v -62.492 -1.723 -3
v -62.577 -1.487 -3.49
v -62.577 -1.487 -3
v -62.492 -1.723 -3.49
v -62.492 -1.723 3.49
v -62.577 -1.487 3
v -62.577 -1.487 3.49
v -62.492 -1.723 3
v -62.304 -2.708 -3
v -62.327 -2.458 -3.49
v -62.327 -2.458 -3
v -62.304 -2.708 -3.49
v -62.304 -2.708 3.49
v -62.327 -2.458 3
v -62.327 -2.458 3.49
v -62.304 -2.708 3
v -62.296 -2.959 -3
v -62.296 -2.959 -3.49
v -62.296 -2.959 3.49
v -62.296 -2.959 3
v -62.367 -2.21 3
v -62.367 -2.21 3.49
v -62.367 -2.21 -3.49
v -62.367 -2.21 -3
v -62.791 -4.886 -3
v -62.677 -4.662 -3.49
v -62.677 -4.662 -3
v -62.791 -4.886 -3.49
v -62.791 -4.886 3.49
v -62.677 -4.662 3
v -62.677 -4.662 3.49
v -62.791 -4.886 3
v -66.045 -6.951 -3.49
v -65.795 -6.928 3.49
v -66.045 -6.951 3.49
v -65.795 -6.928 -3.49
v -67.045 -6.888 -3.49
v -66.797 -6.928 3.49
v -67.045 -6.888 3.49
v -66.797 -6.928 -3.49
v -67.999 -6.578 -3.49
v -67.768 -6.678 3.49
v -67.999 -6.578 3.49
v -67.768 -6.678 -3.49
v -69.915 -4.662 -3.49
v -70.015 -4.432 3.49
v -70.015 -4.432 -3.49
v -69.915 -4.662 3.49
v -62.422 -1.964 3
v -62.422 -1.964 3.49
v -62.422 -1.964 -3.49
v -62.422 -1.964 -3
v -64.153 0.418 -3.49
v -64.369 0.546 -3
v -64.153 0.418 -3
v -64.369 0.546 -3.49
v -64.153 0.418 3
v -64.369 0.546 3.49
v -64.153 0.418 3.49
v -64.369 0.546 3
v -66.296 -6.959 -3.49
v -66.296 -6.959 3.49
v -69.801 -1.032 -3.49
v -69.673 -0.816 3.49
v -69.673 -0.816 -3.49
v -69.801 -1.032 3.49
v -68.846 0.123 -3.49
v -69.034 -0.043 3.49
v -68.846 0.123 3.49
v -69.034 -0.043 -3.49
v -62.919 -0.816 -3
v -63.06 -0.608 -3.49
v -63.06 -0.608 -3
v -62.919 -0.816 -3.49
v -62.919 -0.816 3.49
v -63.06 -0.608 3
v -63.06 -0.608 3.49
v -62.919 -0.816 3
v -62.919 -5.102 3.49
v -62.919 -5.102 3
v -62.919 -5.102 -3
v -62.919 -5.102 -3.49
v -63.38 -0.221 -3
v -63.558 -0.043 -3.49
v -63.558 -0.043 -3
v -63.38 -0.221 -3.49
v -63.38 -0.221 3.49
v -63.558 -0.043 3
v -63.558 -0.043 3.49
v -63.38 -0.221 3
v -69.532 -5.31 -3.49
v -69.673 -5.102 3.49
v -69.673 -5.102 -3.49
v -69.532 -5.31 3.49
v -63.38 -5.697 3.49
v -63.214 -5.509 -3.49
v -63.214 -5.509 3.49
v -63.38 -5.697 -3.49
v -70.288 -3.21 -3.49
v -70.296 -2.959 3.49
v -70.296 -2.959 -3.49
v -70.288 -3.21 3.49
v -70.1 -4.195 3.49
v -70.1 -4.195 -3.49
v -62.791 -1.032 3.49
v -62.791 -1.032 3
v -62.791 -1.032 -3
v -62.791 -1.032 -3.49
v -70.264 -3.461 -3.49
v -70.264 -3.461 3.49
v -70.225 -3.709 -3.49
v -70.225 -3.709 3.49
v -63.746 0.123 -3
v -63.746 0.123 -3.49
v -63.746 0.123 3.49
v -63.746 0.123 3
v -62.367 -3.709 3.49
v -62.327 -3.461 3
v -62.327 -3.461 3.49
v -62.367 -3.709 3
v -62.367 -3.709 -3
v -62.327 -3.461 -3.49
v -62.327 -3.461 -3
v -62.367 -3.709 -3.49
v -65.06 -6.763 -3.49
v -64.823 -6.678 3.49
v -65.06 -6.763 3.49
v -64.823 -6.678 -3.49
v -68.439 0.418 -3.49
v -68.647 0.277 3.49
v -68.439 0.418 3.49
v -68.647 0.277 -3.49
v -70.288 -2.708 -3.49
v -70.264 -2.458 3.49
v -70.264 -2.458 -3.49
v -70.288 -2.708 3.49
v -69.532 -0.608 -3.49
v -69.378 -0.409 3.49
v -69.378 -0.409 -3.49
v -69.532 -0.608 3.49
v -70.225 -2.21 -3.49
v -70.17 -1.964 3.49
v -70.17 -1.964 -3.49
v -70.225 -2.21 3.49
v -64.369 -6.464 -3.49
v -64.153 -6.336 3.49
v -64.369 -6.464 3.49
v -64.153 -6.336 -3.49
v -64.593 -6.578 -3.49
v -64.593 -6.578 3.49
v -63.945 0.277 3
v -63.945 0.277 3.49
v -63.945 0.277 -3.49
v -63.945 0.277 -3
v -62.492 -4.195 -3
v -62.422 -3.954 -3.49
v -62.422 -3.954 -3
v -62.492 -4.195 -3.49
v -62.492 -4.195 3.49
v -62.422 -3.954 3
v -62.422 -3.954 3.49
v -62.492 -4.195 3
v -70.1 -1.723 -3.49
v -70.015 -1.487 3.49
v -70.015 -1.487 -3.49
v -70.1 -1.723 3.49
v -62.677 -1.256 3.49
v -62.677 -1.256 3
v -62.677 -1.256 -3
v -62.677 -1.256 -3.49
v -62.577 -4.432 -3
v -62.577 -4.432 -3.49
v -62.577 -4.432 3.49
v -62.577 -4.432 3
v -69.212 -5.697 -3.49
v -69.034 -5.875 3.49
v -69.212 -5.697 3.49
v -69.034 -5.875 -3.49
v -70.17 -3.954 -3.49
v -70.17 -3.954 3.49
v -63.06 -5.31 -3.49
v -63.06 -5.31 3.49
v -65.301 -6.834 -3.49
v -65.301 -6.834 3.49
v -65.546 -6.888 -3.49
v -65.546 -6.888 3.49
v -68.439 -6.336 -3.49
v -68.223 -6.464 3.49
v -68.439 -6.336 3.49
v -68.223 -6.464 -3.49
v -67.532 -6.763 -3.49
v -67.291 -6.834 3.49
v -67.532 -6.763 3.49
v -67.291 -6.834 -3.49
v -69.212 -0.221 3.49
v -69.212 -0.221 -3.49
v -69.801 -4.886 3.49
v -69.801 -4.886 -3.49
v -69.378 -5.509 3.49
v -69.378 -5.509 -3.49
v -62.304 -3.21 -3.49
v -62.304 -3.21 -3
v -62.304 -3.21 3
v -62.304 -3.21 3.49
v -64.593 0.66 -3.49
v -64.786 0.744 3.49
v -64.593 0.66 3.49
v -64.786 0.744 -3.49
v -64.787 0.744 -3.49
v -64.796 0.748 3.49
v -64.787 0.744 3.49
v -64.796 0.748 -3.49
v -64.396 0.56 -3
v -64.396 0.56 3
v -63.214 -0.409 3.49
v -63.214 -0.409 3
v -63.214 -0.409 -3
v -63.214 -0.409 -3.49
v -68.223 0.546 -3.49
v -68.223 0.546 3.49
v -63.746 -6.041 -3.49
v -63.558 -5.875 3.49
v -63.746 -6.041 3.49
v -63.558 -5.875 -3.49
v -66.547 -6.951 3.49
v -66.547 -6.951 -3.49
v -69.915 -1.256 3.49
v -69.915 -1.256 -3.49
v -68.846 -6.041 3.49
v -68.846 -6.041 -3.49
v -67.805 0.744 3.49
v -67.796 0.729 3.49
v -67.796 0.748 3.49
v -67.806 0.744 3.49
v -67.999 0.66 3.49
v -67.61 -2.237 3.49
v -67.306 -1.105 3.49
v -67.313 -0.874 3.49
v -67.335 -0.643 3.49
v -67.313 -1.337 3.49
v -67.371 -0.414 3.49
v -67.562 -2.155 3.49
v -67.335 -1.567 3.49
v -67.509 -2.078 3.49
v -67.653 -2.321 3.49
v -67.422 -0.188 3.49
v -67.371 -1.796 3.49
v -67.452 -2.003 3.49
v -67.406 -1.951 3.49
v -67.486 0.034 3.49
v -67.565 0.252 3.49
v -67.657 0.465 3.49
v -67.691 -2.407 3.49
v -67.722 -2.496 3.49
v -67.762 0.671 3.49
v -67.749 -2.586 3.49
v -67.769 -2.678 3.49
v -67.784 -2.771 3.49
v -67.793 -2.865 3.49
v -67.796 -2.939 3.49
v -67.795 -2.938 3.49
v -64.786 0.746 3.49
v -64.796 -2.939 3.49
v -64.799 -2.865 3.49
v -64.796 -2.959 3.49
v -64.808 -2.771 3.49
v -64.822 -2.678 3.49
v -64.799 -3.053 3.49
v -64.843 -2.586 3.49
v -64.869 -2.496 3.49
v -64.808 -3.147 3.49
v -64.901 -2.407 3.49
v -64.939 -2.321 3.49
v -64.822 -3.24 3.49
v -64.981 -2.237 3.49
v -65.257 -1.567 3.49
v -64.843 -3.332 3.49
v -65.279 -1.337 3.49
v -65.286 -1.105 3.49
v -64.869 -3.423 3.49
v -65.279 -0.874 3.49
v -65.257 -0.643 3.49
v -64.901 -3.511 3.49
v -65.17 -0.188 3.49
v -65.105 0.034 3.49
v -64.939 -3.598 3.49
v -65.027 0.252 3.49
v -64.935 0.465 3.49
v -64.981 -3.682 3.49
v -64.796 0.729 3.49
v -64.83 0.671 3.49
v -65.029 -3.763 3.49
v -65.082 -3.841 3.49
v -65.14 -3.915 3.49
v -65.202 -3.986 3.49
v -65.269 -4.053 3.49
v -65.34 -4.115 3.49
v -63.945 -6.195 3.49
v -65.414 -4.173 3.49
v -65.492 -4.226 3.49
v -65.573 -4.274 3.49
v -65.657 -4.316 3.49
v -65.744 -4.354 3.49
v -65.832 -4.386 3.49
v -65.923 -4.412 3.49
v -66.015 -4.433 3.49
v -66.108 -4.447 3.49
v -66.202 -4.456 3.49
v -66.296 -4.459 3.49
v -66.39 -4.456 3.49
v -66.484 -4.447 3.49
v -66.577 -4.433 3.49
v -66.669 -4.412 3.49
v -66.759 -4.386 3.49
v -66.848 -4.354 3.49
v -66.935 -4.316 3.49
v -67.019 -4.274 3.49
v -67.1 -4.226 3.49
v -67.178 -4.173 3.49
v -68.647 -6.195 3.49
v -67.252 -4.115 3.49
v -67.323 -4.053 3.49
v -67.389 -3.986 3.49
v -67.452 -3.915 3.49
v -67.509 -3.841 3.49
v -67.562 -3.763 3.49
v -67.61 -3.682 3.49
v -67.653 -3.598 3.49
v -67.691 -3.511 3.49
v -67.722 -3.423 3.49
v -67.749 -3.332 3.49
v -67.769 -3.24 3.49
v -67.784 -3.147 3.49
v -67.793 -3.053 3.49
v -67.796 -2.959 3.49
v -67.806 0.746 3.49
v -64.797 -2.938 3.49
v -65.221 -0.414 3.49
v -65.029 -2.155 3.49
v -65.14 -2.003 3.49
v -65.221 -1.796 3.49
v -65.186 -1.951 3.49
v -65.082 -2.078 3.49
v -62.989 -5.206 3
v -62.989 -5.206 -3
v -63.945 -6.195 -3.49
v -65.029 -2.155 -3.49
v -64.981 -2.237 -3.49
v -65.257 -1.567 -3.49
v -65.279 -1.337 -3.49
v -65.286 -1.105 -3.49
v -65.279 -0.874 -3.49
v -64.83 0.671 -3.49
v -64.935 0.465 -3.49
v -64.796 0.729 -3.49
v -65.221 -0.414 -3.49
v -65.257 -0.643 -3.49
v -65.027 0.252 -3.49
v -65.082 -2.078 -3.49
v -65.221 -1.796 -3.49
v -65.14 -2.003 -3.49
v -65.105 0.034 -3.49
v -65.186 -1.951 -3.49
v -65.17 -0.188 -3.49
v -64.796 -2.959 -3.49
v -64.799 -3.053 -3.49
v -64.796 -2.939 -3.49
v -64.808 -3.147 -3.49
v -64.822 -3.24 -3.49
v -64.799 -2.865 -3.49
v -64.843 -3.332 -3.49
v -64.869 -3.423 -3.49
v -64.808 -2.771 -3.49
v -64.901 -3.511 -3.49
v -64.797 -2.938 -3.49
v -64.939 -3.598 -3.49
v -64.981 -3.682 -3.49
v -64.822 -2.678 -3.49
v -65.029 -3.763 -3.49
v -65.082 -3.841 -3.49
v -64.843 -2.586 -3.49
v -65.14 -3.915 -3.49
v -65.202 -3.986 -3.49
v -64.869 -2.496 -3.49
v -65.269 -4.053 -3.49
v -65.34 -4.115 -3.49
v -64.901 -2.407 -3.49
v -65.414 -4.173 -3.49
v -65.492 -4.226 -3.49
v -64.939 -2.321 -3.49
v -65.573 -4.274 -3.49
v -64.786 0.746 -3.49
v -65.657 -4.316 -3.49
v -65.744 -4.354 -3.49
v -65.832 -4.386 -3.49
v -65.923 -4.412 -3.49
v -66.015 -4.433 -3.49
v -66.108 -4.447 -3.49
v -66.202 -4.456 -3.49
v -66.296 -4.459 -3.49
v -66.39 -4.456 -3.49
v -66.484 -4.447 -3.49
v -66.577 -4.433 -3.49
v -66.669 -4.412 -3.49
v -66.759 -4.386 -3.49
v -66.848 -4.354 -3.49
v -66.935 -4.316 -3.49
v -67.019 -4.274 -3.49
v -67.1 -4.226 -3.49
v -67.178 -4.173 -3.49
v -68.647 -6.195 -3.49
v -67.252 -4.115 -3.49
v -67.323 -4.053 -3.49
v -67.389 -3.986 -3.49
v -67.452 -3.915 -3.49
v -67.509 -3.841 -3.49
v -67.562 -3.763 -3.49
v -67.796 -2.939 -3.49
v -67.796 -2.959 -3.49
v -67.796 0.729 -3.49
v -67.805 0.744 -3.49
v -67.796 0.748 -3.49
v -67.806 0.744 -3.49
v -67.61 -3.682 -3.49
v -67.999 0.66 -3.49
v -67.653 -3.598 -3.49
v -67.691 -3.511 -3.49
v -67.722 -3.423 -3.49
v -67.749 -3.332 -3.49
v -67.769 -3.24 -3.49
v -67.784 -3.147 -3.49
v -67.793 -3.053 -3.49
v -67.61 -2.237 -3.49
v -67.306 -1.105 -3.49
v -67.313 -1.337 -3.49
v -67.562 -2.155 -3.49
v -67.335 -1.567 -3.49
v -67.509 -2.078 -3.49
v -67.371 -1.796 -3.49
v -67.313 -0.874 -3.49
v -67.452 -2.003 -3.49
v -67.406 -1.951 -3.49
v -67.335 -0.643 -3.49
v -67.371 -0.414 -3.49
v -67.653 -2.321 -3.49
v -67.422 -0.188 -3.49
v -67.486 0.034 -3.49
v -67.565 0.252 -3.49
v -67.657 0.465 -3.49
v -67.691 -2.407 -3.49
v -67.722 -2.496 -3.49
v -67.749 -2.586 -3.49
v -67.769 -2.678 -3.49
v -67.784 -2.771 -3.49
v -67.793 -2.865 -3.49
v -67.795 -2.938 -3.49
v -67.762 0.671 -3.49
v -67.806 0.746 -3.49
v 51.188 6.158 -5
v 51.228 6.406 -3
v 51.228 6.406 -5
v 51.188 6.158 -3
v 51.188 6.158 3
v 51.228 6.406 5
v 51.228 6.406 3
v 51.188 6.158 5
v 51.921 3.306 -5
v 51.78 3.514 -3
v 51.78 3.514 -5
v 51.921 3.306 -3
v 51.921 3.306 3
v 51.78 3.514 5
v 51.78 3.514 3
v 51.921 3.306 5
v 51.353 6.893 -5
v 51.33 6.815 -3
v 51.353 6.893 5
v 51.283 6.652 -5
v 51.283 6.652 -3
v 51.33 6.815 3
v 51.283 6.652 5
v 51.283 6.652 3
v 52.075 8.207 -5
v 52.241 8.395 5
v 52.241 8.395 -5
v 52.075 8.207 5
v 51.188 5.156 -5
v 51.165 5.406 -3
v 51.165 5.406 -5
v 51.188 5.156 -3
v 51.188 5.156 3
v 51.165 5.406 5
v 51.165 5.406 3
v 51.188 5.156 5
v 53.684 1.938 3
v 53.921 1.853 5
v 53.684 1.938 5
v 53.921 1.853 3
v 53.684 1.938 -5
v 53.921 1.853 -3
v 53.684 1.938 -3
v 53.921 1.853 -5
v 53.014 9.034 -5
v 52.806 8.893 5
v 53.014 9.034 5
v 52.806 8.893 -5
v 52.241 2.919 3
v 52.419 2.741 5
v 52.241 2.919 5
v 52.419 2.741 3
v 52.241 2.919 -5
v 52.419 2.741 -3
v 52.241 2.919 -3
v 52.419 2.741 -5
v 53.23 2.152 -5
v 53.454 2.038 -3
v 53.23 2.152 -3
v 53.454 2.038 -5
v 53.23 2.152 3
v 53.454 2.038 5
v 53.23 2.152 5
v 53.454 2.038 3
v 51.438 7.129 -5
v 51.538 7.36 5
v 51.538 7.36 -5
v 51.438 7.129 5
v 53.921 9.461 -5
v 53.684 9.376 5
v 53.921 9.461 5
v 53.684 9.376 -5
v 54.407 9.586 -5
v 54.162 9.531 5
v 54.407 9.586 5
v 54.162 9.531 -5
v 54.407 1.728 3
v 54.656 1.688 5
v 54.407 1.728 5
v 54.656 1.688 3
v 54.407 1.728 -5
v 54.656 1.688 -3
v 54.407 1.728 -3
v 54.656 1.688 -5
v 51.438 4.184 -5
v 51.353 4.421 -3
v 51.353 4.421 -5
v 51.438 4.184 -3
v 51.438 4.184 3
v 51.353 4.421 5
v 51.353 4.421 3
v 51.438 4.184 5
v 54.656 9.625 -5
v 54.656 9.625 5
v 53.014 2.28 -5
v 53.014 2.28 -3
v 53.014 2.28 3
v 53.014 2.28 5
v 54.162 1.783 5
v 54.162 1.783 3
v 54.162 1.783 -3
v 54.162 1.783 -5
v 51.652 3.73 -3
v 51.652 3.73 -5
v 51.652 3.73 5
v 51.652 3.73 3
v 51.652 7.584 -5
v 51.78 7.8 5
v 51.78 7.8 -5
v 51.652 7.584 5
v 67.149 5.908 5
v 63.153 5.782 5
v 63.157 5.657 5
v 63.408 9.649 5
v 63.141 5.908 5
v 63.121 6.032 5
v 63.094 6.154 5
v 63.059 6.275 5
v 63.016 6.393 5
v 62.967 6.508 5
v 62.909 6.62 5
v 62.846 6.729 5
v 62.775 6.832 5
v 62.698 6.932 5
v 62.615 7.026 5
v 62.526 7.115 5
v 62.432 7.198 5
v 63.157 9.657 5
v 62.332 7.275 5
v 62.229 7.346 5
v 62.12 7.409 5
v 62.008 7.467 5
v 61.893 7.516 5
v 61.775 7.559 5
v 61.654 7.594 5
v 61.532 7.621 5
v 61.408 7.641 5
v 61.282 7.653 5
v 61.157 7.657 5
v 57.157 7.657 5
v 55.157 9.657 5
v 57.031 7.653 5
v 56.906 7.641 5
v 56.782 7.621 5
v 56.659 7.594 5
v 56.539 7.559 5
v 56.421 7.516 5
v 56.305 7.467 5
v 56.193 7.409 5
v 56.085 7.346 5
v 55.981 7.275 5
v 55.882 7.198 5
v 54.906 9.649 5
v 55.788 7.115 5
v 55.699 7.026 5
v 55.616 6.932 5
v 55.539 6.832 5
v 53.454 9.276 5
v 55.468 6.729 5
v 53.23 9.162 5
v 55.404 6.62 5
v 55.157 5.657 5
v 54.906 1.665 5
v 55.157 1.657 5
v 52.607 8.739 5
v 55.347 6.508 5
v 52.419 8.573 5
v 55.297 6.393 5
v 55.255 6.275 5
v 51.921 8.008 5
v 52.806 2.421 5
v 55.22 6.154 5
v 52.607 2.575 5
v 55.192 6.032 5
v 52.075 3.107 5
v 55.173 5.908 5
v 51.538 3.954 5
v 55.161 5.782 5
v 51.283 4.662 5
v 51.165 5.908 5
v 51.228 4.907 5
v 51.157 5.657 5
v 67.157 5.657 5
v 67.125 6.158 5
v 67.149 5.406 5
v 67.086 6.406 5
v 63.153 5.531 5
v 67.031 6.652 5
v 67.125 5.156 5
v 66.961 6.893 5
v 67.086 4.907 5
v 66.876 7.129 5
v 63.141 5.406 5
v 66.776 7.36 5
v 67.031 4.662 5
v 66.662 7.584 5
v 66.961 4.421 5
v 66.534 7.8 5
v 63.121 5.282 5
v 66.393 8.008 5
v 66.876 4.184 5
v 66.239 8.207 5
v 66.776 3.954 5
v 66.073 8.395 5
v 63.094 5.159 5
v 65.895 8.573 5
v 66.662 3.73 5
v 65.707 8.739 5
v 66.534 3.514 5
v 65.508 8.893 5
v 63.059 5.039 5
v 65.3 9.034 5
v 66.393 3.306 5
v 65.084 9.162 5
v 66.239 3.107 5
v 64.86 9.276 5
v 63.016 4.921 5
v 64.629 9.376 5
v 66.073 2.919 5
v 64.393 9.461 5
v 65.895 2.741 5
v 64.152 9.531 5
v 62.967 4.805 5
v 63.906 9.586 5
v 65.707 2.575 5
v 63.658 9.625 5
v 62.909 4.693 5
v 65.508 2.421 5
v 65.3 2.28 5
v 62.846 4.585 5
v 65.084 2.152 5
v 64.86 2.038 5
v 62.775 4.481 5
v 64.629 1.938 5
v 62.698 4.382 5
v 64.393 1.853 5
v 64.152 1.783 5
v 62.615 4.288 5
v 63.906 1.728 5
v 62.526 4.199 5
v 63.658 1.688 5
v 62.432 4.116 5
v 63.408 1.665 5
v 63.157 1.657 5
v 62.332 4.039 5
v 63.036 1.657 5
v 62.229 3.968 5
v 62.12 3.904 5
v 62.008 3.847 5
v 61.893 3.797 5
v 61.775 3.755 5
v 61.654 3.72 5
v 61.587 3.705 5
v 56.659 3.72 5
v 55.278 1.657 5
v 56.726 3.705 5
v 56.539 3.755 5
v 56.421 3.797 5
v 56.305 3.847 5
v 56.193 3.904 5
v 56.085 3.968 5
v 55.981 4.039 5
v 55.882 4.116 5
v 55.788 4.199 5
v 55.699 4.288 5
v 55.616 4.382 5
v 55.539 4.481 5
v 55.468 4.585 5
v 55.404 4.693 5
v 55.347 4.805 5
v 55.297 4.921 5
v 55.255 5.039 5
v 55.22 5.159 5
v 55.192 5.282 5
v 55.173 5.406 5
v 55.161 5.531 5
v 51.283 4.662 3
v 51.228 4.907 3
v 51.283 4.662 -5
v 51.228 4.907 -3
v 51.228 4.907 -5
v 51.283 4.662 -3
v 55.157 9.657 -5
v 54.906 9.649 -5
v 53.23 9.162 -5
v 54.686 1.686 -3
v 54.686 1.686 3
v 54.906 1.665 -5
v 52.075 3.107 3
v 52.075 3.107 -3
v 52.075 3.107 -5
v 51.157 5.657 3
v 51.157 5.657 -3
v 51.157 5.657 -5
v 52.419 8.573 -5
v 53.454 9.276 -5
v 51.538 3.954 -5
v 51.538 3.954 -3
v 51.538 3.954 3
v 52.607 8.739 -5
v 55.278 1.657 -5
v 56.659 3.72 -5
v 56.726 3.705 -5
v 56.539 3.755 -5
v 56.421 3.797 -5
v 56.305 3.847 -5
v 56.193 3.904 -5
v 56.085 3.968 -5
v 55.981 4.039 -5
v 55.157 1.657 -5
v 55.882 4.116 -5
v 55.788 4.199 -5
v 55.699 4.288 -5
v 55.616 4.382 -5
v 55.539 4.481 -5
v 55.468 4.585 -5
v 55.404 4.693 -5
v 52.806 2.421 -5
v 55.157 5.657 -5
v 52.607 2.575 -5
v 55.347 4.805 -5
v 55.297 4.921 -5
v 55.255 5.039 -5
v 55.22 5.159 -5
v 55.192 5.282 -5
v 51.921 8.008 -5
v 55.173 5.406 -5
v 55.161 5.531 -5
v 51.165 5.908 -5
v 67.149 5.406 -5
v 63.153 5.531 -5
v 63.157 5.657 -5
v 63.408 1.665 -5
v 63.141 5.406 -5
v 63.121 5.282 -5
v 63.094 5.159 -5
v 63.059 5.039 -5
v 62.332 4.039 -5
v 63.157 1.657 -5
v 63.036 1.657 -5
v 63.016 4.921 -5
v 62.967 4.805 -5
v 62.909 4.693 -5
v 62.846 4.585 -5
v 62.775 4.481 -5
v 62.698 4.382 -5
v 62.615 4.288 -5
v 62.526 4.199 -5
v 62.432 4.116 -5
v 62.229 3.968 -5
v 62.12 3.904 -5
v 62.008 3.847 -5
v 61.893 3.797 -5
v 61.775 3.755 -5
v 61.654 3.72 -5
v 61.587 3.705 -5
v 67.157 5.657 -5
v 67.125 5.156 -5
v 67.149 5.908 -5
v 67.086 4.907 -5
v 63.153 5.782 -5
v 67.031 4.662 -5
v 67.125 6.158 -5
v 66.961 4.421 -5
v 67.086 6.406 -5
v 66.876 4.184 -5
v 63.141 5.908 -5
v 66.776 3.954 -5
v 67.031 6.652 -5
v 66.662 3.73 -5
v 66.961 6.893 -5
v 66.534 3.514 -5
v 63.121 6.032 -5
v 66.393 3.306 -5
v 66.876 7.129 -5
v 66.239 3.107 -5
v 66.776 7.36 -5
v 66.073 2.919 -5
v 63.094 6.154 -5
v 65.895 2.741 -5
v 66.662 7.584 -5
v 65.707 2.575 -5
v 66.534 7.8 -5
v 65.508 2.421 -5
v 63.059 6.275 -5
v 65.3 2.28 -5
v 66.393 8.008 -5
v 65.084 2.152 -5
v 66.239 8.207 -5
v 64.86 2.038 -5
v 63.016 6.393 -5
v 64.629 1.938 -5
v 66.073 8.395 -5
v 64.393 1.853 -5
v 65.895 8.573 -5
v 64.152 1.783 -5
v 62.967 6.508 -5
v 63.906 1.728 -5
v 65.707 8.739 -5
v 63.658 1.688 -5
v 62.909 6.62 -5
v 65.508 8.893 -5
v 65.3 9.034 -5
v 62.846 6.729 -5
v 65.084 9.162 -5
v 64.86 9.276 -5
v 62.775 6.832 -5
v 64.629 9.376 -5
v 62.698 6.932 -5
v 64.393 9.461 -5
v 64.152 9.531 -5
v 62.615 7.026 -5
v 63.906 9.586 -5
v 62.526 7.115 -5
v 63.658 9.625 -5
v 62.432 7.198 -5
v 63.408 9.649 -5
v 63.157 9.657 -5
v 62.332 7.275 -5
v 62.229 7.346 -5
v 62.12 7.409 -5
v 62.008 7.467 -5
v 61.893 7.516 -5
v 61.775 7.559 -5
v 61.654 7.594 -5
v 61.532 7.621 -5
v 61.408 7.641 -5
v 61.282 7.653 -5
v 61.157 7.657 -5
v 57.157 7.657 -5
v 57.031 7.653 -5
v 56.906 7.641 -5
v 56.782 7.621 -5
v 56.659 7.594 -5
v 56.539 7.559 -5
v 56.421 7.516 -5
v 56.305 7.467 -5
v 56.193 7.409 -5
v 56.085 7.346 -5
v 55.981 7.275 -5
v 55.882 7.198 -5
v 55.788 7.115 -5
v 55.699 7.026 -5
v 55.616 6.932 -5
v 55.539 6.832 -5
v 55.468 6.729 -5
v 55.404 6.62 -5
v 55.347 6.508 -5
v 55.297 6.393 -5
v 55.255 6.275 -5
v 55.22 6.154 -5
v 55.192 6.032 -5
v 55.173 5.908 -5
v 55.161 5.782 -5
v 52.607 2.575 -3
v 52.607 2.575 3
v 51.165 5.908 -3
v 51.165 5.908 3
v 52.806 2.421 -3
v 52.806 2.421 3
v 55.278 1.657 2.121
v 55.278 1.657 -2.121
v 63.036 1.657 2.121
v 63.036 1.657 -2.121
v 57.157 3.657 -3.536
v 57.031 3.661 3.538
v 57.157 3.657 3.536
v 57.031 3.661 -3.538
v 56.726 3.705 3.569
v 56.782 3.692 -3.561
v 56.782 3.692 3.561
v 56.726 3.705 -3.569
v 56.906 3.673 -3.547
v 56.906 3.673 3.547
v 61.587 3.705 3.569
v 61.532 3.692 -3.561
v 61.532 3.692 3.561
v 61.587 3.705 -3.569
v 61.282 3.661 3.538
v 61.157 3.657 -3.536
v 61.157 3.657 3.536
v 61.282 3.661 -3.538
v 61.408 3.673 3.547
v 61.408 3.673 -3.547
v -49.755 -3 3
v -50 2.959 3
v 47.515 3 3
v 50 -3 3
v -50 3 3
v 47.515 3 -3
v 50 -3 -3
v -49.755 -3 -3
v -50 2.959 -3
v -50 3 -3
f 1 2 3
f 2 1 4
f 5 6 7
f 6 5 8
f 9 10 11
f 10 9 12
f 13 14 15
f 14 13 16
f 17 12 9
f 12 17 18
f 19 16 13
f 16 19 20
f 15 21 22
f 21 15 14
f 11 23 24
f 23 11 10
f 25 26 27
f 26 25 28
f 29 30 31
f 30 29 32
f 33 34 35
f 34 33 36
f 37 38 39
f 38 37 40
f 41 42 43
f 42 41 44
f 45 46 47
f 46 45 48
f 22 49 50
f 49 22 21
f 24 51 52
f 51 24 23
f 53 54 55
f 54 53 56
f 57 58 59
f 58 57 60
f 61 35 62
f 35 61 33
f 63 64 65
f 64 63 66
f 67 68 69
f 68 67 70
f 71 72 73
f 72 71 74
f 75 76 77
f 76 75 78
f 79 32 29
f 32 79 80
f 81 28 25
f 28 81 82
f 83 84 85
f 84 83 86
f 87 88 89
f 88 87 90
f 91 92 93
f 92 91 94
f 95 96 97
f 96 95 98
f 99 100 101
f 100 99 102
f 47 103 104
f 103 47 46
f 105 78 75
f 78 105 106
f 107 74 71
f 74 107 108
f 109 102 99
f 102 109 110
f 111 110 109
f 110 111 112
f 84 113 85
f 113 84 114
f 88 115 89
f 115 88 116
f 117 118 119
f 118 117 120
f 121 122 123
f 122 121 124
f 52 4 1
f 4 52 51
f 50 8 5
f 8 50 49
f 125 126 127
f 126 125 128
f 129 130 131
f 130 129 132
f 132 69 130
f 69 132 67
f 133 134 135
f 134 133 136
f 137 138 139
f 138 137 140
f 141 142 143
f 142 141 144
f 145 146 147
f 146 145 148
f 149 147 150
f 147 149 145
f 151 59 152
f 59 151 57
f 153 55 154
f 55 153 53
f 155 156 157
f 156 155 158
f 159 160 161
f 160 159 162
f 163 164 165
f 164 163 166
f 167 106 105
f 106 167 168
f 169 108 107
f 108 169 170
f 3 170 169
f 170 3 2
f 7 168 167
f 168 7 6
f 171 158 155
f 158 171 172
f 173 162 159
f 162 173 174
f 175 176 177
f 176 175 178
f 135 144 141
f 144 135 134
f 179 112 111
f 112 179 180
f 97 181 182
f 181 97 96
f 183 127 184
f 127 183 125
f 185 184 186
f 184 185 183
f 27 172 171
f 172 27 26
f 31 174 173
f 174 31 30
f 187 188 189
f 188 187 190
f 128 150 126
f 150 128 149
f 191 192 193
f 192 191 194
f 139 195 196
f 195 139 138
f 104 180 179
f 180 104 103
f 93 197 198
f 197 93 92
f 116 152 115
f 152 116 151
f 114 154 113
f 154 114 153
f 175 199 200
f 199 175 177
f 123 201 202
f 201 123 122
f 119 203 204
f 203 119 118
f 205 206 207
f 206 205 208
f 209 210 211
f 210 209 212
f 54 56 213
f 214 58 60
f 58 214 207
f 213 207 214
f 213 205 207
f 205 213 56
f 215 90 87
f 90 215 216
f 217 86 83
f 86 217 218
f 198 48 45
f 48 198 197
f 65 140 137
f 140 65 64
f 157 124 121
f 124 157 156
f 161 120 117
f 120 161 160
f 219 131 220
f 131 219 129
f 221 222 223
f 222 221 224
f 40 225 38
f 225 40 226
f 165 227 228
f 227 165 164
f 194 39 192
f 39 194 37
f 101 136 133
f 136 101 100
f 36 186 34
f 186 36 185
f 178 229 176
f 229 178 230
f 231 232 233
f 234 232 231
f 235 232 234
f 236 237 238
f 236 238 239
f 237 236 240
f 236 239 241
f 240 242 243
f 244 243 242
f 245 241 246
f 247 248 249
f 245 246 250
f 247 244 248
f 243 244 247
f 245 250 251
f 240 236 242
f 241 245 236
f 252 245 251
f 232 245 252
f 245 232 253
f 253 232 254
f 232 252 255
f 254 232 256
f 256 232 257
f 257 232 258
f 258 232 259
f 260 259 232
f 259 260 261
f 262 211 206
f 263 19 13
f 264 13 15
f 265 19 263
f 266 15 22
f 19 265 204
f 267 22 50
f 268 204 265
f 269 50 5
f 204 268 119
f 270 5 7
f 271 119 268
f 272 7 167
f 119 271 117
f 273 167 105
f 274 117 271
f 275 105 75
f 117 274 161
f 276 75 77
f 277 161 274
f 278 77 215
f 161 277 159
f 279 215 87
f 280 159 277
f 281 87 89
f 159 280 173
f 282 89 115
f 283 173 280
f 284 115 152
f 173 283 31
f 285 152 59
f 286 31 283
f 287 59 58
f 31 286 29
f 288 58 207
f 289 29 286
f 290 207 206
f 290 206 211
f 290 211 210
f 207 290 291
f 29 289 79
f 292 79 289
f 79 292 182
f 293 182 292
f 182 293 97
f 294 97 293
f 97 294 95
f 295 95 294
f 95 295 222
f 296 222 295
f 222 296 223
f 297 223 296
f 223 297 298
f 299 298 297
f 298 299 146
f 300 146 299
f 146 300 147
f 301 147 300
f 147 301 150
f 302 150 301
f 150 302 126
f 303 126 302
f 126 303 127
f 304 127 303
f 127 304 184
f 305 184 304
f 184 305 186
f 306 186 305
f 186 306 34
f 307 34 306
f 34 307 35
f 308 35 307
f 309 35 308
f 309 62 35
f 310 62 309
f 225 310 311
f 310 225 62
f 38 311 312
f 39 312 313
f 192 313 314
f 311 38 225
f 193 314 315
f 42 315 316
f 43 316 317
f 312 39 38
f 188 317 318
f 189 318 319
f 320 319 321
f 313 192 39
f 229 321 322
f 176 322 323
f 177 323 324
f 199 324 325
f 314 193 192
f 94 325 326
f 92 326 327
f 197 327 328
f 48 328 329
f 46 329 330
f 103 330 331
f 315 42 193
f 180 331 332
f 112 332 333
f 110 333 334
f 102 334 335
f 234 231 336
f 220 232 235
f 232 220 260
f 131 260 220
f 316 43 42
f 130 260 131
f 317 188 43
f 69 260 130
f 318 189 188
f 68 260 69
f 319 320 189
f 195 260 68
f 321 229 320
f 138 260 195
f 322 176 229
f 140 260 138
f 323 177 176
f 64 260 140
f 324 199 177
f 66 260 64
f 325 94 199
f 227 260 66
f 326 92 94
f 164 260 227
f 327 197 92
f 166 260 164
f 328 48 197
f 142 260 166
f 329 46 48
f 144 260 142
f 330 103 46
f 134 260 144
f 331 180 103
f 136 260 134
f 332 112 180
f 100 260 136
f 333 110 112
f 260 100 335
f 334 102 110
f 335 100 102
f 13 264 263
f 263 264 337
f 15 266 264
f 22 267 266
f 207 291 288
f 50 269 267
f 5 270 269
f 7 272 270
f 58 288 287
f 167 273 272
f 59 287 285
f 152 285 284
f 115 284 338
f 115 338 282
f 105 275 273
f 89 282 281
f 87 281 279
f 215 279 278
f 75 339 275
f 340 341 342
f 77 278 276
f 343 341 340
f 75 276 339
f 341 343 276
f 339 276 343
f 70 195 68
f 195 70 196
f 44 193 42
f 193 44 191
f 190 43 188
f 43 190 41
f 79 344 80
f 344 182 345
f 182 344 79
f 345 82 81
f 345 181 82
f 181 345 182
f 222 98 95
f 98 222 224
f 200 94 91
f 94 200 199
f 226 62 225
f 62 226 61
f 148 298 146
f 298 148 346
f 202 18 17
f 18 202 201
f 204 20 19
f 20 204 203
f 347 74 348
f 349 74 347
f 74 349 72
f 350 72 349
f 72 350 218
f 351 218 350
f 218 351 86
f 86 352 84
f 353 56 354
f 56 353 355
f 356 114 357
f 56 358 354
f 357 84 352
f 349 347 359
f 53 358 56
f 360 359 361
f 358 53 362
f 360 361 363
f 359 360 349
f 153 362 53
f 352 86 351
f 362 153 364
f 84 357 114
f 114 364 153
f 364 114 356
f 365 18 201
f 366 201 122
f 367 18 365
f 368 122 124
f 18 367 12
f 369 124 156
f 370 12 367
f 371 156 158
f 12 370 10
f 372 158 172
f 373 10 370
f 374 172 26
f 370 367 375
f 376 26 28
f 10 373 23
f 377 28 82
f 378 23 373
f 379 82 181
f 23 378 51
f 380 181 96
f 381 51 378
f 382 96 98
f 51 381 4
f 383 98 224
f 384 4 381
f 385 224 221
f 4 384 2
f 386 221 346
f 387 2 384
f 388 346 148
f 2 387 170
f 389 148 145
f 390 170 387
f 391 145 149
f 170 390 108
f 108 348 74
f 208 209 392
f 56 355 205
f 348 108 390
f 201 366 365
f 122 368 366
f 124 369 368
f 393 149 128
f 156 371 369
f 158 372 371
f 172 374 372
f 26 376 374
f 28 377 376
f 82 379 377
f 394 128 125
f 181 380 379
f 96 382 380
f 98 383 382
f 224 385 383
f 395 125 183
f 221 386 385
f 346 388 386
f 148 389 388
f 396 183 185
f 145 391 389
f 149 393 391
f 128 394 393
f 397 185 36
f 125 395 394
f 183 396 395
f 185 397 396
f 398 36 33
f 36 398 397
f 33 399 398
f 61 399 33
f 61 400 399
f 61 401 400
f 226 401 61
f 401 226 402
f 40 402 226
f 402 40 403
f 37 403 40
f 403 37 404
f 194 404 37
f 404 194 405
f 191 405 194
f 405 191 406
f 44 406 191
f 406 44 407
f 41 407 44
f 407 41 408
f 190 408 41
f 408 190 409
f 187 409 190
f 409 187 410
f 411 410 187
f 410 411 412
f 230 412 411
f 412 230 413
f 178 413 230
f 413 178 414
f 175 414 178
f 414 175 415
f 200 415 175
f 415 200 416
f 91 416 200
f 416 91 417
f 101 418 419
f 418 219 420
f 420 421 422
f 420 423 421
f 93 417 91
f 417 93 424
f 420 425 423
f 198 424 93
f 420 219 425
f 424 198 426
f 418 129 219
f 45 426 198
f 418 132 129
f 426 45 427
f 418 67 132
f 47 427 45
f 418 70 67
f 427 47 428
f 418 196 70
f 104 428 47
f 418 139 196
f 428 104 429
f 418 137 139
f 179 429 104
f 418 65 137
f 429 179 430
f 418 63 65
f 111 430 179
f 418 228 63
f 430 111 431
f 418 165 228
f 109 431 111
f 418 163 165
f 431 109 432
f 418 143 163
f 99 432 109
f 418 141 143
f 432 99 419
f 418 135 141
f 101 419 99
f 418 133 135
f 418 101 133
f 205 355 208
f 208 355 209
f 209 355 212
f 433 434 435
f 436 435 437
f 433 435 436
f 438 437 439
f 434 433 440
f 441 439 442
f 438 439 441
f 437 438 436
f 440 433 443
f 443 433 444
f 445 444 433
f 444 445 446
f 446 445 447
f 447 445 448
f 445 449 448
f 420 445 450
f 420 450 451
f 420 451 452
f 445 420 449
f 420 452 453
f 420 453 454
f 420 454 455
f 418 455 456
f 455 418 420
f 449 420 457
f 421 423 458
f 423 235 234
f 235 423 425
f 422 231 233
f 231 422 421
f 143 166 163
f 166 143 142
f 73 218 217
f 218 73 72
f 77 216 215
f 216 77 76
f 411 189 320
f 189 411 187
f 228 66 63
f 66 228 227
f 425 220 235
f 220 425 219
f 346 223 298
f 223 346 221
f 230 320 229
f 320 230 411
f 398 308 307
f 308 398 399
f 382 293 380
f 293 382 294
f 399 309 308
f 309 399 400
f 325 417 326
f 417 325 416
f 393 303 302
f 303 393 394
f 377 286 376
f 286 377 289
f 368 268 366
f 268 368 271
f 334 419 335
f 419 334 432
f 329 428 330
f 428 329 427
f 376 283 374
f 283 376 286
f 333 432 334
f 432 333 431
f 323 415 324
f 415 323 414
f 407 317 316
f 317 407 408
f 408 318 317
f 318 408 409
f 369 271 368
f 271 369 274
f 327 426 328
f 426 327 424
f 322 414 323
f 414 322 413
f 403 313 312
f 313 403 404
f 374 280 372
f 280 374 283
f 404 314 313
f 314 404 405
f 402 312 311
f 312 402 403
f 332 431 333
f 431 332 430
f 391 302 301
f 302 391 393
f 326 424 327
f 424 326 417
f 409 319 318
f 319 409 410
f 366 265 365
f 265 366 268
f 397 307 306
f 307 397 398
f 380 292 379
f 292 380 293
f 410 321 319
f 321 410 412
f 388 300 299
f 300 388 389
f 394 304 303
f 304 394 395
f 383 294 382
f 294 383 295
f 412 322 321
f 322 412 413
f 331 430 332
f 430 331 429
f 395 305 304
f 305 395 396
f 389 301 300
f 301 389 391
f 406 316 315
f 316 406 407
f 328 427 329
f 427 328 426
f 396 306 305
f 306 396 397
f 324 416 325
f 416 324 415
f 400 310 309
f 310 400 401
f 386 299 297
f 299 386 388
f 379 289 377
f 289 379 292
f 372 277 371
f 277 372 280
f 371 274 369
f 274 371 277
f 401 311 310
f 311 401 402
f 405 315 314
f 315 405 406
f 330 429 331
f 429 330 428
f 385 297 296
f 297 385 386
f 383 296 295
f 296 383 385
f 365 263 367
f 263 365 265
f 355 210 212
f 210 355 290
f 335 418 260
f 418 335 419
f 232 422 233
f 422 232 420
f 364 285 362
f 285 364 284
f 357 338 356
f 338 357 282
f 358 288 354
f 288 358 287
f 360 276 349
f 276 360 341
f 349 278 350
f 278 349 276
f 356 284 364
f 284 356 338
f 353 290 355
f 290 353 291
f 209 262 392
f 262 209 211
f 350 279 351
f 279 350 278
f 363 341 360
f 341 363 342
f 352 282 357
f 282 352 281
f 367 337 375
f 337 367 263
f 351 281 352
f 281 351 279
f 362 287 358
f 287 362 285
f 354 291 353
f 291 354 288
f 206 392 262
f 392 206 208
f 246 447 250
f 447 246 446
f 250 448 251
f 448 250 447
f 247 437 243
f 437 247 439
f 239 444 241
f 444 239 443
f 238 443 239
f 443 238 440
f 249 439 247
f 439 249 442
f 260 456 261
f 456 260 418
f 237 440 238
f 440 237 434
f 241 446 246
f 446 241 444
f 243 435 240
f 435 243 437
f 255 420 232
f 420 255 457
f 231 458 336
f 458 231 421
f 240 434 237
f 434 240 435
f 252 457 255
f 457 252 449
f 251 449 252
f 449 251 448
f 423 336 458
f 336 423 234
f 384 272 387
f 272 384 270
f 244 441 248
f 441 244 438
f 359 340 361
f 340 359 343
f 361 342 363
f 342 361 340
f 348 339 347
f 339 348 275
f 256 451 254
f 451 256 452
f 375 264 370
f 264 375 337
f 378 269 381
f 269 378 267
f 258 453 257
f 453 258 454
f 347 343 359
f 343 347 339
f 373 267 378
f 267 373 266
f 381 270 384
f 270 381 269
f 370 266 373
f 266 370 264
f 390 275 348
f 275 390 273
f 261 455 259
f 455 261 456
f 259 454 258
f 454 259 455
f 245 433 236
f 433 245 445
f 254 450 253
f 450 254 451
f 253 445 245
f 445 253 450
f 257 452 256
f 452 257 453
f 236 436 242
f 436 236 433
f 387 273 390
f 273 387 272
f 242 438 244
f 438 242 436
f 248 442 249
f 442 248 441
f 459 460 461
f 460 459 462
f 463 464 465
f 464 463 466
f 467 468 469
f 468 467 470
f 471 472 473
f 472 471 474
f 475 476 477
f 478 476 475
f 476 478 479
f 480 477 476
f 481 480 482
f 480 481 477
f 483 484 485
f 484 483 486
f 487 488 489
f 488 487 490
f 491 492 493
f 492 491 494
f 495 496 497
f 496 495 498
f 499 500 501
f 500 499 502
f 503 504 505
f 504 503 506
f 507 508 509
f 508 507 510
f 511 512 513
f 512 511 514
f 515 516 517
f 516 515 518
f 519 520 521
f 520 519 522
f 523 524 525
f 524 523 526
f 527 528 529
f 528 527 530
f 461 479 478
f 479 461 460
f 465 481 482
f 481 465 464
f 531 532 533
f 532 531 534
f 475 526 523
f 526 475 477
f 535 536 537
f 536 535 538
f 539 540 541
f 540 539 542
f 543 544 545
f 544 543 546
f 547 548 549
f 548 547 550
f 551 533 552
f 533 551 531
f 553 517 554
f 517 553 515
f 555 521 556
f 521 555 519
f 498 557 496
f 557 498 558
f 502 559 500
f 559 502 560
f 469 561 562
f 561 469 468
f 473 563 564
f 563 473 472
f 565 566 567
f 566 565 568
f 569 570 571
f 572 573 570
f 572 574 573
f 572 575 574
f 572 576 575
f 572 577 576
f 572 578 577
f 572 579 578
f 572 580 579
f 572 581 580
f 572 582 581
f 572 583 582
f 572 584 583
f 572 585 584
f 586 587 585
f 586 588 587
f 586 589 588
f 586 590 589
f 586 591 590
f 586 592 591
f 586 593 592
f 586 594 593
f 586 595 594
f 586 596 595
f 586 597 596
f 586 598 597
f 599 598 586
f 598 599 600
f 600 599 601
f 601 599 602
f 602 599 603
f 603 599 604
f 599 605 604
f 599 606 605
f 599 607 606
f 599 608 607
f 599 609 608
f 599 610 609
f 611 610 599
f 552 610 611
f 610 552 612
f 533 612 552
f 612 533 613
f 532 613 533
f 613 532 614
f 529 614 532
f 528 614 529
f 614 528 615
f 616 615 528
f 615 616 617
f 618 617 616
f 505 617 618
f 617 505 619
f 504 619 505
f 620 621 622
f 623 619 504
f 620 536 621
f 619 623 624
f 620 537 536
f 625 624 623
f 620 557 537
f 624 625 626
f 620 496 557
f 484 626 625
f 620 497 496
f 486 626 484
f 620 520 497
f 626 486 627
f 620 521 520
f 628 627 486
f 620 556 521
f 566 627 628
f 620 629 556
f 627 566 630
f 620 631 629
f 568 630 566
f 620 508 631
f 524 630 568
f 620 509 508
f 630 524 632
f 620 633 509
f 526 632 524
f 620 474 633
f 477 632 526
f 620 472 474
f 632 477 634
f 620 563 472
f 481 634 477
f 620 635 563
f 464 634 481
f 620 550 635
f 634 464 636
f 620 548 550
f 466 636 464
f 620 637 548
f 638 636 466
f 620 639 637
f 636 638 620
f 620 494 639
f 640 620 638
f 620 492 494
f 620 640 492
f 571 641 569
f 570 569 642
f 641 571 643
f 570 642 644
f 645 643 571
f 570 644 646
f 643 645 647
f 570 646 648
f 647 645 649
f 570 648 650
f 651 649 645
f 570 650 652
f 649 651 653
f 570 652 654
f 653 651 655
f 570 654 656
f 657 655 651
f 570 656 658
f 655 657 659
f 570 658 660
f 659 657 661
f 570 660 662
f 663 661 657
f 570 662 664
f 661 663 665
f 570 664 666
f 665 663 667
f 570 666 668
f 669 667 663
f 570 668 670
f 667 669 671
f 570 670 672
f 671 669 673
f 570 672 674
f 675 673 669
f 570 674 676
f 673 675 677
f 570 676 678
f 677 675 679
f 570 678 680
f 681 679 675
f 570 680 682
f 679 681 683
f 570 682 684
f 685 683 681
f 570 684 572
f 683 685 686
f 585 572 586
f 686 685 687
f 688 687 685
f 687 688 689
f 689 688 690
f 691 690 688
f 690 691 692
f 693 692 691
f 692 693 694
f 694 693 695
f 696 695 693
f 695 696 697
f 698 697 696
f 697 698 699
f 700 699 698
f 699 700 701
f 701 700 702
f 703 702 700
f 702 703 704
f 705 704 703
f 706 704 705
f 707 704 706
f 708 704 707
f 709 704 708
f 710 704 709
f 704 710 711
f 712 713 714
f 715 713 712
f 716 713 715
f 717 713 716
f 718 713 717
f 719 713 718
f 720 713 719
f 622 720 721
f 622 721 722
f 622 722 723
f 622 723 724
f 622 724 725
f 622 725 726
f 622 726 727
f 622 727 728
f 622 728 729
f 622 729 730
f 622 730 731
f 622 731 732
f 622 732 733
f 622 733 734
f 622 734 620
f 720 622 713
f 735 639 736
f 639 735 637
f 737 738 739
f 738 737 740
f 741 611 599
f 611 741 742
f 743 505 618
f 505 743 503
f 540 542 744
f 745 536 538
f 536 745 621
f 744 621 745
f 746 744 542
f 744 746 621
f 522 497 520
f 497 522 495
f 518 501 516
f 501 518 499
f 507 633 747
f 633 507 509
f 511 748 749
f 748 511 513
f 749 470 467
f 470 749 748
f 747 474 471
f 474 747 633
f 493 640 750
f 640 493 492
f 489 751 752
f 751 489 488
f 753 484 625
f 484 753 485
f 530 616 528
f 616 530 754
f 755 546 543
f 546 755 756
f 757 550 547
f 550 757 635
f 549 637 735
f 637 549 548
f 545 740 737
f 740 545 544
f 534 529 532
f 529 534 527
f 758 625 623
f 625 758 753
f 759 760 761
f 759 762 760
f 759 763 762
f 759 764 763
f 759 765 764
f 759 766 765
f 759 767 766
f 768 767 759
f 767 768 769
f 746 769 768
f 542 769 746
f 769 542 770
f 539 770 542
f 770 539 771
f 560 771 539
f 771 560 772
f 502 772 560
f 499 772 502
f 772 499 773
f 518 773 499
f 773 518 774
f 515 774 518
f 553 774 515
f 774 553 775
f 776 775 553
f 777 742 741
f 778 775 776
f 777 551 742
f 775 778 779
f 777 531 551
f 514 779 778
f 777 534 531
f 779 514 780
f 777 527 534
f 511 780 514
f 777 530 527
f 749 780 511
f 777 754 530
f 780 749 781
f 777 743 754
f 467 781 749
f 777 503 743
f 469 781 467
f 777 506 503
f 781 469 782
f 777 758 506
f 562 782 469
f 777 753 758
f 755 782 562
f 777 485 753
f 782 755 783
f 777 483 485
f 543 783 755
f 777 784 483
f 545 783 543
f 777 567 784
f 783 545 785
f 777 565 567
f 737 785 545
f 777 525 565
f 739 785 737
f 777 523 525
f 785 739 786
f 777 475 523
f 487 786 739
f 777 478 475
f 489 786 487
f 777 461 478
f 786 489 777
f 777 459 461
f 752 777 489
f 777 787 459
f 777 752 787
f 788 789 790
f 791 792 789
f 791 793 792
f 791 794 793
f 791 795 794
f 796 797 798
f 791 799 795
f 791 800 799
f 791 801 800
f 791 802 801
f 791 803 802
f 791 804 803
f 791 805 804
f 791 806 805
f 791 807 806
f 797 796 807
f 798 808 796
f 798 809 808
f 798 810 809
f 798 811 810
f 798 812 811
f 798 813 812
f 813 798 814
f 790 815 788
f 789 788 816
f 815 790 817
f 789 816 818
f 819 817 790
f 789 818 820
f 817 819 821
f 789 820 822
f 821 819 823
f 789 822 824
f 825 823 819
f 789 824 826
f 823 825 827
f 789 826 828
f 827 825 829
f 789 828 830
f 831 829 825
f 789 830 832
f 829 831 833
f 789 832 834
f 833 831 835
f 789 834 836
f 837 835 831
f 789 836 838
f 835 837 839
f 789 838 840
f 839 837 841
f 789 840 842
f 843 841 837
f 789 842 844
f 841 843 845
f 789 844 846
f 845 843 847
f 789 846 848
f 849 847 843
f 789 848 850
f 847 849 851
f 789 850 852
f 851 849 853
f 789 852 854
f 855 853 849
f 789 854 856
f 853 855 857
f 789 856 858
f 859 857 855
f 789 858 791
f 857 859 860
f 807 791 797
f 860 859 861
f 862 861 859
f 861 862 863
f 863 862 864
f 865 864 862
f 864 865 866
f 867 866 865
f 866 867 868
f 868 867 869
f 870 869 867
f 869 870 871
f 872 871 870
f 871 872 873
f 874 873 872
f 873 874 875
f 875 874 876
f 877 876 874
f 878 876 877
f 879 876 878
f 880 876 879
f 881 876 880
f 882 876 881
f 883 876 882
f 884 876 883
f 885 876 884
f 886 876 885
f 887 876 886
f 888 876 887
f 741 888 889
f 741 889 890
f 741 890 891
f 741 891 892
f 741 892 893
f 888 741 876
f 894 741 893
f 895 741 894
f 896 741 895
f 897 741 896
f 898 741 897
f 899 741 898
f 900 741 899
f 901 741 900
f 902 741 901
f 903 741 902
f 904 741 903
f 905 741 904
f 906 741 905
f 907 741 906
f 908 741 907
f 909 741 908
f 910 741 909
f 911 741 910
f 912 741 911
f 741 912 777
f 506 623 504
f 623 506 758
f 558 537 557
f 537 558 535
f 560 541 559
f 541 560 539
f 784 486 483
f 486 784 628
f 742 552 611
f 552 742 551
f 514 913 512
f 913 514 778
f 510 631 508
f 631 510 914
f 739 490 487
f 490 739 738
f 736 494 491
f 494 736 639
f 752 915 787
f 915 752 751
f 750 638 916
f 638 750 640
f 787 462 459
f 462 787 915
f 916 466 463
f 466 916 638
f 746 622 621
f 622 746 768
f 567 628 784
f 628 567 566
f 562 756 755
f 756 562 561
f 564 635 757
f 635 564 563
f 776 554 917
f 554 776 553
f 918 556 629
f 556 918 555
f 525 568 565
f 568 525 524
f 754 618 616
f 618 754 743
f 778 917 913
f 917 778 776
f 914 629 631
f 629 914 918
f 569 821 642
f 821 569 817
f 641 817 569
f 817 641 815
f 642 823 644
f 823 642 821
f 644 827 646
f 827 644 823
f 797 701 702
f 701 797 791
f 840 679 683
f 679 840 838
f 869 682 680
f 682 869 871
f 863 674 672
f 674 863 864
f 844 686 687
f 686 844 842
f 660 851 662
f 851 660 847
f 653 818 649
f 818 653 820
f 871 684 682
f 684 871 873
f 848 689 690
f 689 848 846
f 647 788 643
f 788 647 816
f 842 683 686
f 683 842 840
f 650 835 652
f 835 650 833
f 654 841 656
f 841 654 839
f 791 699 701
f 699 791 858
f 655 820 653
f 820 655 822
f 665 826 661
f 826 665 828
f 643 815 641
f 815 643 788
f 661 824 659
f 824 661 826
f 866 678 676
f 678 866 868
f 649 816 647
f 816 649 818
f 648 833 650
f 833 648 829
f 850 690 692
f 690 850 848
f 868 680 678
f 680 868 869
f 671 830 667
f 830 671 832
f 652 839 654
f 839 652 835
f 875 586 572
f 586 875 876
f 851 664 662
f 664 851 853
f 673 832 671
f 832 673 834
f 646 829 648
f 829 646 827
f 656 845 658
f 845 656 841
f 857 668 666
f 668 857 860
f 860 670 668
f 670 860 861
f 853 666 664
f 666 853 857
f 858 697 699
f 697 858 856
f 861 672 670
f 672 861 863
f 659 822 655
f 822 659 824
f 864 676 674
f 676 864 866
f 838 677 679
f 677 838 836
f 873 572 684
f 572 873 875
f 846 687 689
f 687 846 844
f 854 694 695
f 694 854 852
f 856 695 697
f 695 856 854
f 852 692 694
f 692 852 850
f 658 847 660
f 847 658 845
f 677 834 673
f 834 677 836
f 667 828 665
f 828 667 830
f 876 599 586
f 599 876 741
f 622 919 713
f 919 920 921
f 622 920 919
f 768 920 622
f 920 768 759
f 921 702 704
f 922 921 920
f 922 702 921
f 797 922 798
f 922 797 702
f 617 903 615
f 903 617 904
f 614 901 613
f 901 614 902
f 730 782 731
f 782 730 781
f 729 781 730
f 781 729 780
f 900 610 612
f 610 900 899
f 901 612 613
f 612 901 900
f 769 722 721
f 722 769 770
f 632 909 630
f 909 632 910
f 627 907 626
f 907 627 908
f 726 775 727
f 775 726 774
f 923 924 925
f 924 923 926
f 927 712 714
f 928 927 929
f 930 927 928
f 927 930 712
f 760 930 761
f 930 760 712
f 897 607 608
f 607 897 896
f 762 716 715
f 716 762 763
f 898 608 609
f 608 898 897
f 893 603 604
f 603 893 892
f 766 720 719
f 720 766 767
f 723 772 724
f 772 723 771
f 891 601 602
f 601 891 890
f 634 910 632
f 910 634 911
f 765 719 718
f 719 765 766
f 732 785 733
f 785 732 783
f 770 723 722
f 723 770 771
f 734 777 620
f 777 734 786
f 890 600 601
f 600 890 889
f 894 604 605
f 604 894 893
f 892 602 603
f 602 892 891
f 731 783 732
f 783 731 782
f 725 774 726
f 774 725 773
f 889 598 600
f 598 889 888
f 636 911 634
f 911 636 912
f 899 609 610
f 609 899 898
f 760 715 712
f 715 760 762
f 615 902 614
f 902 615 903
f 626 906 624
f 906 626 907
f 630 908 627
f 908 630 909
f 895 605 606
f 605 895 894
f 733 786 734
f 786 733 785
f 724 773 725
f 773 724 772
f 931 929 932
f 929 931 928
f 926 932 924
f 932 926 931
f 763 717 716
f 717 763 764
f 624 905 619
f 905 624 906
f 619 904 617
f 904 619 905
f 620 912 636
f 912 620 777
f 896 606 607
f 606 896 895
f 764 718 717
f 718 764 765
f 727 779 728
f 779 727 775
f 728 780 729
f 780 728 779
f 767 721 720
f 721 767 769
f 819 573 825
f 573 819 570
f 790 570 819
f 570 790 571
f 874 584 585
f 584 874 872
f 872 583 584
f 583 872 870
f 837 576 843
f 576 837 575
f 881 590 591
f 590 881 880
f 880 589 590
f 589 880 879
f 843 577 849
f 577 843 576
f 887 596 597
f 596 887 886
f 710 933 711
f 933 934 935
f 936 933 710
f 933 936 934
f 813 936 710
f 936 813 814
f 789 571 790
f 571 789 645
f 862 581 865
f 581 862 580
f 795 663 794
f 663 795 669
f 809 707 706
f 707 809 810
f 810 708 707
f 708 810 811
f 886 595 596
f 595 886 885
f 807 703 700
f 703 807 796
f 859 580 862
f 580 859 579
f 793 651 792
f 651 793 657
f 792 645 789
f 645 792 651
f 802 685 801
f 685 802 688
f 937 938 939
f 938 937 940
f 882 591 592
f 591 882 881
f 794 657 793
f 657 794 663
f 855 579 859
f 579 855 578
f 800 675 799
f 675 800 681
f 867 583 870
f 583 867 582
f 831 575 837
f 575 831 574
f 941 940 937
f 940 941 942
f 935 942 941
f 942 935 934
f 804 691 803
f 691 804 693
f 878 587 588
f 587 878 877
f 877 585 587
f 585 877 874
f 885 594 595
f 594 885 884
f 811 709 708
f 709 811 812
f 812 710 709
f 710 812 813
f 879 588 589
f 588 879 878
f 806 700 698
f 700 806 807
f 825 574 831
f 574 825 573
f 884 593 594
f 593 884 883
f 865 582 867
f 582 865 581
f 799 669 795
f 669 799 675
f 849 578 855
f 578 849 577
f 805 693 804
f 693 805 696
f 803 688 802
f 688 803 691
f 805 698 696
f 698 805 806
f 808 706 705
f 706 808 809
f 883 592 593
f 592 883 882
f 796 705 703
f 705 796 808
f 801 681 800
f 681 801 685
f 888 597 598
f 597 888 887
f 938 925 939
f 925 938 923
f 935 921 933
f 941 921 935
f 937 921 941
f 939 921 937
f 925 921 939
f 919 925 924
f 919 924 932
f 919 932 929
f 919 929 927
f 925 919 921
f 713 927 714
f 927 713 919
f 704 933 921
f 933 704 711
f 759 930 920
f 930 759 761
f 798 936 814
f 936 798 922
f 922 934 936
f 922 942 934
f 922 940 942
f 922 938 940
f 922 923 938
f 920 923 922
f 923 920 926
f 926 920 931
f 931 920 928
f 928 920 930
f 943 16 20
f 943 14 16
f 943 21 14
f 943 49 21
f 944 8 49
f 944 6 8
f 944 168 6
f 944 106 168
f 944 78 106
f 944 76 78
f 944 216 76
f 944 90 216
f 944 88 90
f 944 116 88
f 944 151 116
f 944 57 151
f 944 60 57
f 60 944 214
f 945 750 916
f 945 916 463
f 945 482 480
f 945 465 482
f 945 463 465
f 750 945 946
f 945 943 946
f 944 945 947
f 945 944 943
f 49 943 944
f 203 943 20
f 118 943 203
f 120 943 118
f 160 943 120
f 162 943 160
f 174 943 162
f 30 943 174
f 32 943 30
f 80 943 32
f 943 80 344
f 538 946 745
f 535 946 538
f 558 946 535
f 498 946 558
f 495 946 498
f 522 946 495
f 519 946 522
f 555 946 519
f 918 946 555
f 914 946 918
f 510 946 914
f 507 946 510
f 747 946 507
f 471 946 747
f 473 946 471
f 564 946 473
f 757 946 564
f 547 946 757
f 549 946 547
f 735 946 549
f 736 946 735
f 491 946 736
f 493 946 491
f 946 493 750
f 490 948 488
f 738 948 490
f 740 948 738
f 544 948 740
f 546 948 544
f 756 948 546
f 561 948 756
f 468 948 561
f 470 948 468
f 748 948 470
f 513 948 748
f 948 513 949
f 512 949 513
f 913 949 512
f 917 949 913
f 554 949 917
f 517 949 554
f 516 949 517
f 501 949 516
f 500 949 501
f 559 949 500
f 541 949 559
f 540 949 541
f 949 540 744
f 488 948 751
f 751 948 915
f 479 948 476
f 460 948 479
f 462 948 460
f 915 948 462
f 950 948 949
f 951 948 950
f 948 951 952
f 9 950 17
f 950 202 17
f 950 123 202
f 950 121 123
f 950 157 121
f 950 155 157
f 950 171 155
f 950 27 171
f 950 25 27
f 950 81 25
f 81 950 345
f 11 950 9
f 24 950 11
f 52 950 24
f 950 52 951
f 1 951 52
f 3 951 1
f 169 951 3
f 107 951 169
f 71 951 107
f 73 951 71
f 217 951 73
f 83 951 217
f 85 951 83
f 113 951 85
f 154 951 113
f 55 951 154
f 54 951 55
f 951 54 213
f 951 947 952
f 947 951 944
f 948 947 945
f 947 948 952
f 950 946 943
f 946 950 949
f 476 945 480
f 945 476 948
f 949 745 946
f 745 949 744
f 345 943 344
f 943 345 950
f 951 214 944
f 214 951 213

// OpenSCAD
// file: latch.scad
eps = 0.01;

module latch_1( h, d1, d2) {
    r1 = d1 / 2;
    r2 = d2 / 2;

    d = sqrt( r1 * r1 - r2 * r2 );
    d_2 = d / 2;
    h1 = 0.5;
    R = ( d_2 * d_2  + h1 * h1 ) / ( 2 * h1 );
    
    module aux() {
        translate( [ R - h1, 0, 0 ] )
            difference() {
                cylinder(h = h, r1 = R, r2 = R, center = true, $fn=100);
            
                translate( [ h1, 0 ,0 ] )
                    cube( [ 2 * R, 2 * R, h + eps ], center = true );
            }
    }
 
    module aux_2() {
        difference() {
            union() {
                translate( [ r2 + eps, d_2, 0 ] )
                    aux();
                
                translate( [ -r2 - eps, d_2, 0 ] )
                    rotate( [ 0, 0, 180 ] )
                        aux();
            }
            
            cylinder(h = h + eps, r1 = r2, r2 = r2, center = true, $fn=100);
        }
    }

    union() {
        difference() {
            cylinder(h = h, r1 = r1, r2 = r1, center = true, $fn=100);
            
            cylinder(h = h + eps, r1 = r2, r2 = r2, center = true, $fn=100);
            translate( [ 0, r1 / 2, 0 ] )
                cube( [ 2 * r2, r1, h + eps ],center = true);
        }
    
        aux_2();
    }
}
// main file
use <latch.scad>

eps = 0.01;

module shape( l , w, h ) {
    union() {
        translate( [ - l / 2, 0 , 0 ] )
            cylinder(h = h, r1 = w / 2, r2 = w / 2, center = true, $fn=100);
        
        translate( [ + l / 2, 0 , 0 ] )
            cylinder(h = h, r1 = w / 2, r2 = w / 2, center = true, $fn=100);
        
        cube( [ l, w, h ], center = true );
    }
}

// this part is not reused, so to make it easier I've just hardcoded
// values related to this opening
module latch_opening() {
    r = 6;
    tmpR = r * sqrt( 2 ) ;
        rotate( [ -90, 0, 0 ] )
            rotate( [ 0, 0, 45 ] )
                cylinder( h = tmpR, r1 = tmpR, r2 = 0, $fn=4);
}

module latch_2( l, w, h ) {
    difference() {
        shape( l, w, h );
        
        shape( l - 4, w - 4, h + eps );
        
        
        translate( [ 0, -7, 6 ] )
            latch_opening();
        
        translate( [ 0, -7, -6 ] )
            latch_opening();
    }
}

module lever() {
    union() {
        l = 100;
        w = 6;
        h = 6;
        cube( [ l, w, h ], center = true );
        
        l2 = 8;
        alfa = 45;
        translate( [ l / 2, - w / 2 , - h / 2 ] )
            rotate( [ 0, 0, alfa ] )
                cube( [ l2, w, h ], center = false );
        
        l3 = 15;
        beta = atan( 2.5 / l3 );
        w3 = w * cos( beta );
        translate( [ - l / 2, w3 / 2 , - h / 2 ] )
            rotate( [ 0, 0, 180 + beta ] )
                cube( [ l3, w3, h ], center = false );
        
        d1 = 8;
        d2 = 3;
        translate( [ - l / 2 - l3 * cos( beta ) - d2 / 2, -w3 /2 , 0 ] )
            latch_1( 6.98, d1, d2 );
            
        translate( [ l / 2 + l2 * cos( alfa ) + 3.5, l2 * sin( alfa ) , 0 ] )
            latch_2( 8, 8, 10 );
    }
}


lever();
